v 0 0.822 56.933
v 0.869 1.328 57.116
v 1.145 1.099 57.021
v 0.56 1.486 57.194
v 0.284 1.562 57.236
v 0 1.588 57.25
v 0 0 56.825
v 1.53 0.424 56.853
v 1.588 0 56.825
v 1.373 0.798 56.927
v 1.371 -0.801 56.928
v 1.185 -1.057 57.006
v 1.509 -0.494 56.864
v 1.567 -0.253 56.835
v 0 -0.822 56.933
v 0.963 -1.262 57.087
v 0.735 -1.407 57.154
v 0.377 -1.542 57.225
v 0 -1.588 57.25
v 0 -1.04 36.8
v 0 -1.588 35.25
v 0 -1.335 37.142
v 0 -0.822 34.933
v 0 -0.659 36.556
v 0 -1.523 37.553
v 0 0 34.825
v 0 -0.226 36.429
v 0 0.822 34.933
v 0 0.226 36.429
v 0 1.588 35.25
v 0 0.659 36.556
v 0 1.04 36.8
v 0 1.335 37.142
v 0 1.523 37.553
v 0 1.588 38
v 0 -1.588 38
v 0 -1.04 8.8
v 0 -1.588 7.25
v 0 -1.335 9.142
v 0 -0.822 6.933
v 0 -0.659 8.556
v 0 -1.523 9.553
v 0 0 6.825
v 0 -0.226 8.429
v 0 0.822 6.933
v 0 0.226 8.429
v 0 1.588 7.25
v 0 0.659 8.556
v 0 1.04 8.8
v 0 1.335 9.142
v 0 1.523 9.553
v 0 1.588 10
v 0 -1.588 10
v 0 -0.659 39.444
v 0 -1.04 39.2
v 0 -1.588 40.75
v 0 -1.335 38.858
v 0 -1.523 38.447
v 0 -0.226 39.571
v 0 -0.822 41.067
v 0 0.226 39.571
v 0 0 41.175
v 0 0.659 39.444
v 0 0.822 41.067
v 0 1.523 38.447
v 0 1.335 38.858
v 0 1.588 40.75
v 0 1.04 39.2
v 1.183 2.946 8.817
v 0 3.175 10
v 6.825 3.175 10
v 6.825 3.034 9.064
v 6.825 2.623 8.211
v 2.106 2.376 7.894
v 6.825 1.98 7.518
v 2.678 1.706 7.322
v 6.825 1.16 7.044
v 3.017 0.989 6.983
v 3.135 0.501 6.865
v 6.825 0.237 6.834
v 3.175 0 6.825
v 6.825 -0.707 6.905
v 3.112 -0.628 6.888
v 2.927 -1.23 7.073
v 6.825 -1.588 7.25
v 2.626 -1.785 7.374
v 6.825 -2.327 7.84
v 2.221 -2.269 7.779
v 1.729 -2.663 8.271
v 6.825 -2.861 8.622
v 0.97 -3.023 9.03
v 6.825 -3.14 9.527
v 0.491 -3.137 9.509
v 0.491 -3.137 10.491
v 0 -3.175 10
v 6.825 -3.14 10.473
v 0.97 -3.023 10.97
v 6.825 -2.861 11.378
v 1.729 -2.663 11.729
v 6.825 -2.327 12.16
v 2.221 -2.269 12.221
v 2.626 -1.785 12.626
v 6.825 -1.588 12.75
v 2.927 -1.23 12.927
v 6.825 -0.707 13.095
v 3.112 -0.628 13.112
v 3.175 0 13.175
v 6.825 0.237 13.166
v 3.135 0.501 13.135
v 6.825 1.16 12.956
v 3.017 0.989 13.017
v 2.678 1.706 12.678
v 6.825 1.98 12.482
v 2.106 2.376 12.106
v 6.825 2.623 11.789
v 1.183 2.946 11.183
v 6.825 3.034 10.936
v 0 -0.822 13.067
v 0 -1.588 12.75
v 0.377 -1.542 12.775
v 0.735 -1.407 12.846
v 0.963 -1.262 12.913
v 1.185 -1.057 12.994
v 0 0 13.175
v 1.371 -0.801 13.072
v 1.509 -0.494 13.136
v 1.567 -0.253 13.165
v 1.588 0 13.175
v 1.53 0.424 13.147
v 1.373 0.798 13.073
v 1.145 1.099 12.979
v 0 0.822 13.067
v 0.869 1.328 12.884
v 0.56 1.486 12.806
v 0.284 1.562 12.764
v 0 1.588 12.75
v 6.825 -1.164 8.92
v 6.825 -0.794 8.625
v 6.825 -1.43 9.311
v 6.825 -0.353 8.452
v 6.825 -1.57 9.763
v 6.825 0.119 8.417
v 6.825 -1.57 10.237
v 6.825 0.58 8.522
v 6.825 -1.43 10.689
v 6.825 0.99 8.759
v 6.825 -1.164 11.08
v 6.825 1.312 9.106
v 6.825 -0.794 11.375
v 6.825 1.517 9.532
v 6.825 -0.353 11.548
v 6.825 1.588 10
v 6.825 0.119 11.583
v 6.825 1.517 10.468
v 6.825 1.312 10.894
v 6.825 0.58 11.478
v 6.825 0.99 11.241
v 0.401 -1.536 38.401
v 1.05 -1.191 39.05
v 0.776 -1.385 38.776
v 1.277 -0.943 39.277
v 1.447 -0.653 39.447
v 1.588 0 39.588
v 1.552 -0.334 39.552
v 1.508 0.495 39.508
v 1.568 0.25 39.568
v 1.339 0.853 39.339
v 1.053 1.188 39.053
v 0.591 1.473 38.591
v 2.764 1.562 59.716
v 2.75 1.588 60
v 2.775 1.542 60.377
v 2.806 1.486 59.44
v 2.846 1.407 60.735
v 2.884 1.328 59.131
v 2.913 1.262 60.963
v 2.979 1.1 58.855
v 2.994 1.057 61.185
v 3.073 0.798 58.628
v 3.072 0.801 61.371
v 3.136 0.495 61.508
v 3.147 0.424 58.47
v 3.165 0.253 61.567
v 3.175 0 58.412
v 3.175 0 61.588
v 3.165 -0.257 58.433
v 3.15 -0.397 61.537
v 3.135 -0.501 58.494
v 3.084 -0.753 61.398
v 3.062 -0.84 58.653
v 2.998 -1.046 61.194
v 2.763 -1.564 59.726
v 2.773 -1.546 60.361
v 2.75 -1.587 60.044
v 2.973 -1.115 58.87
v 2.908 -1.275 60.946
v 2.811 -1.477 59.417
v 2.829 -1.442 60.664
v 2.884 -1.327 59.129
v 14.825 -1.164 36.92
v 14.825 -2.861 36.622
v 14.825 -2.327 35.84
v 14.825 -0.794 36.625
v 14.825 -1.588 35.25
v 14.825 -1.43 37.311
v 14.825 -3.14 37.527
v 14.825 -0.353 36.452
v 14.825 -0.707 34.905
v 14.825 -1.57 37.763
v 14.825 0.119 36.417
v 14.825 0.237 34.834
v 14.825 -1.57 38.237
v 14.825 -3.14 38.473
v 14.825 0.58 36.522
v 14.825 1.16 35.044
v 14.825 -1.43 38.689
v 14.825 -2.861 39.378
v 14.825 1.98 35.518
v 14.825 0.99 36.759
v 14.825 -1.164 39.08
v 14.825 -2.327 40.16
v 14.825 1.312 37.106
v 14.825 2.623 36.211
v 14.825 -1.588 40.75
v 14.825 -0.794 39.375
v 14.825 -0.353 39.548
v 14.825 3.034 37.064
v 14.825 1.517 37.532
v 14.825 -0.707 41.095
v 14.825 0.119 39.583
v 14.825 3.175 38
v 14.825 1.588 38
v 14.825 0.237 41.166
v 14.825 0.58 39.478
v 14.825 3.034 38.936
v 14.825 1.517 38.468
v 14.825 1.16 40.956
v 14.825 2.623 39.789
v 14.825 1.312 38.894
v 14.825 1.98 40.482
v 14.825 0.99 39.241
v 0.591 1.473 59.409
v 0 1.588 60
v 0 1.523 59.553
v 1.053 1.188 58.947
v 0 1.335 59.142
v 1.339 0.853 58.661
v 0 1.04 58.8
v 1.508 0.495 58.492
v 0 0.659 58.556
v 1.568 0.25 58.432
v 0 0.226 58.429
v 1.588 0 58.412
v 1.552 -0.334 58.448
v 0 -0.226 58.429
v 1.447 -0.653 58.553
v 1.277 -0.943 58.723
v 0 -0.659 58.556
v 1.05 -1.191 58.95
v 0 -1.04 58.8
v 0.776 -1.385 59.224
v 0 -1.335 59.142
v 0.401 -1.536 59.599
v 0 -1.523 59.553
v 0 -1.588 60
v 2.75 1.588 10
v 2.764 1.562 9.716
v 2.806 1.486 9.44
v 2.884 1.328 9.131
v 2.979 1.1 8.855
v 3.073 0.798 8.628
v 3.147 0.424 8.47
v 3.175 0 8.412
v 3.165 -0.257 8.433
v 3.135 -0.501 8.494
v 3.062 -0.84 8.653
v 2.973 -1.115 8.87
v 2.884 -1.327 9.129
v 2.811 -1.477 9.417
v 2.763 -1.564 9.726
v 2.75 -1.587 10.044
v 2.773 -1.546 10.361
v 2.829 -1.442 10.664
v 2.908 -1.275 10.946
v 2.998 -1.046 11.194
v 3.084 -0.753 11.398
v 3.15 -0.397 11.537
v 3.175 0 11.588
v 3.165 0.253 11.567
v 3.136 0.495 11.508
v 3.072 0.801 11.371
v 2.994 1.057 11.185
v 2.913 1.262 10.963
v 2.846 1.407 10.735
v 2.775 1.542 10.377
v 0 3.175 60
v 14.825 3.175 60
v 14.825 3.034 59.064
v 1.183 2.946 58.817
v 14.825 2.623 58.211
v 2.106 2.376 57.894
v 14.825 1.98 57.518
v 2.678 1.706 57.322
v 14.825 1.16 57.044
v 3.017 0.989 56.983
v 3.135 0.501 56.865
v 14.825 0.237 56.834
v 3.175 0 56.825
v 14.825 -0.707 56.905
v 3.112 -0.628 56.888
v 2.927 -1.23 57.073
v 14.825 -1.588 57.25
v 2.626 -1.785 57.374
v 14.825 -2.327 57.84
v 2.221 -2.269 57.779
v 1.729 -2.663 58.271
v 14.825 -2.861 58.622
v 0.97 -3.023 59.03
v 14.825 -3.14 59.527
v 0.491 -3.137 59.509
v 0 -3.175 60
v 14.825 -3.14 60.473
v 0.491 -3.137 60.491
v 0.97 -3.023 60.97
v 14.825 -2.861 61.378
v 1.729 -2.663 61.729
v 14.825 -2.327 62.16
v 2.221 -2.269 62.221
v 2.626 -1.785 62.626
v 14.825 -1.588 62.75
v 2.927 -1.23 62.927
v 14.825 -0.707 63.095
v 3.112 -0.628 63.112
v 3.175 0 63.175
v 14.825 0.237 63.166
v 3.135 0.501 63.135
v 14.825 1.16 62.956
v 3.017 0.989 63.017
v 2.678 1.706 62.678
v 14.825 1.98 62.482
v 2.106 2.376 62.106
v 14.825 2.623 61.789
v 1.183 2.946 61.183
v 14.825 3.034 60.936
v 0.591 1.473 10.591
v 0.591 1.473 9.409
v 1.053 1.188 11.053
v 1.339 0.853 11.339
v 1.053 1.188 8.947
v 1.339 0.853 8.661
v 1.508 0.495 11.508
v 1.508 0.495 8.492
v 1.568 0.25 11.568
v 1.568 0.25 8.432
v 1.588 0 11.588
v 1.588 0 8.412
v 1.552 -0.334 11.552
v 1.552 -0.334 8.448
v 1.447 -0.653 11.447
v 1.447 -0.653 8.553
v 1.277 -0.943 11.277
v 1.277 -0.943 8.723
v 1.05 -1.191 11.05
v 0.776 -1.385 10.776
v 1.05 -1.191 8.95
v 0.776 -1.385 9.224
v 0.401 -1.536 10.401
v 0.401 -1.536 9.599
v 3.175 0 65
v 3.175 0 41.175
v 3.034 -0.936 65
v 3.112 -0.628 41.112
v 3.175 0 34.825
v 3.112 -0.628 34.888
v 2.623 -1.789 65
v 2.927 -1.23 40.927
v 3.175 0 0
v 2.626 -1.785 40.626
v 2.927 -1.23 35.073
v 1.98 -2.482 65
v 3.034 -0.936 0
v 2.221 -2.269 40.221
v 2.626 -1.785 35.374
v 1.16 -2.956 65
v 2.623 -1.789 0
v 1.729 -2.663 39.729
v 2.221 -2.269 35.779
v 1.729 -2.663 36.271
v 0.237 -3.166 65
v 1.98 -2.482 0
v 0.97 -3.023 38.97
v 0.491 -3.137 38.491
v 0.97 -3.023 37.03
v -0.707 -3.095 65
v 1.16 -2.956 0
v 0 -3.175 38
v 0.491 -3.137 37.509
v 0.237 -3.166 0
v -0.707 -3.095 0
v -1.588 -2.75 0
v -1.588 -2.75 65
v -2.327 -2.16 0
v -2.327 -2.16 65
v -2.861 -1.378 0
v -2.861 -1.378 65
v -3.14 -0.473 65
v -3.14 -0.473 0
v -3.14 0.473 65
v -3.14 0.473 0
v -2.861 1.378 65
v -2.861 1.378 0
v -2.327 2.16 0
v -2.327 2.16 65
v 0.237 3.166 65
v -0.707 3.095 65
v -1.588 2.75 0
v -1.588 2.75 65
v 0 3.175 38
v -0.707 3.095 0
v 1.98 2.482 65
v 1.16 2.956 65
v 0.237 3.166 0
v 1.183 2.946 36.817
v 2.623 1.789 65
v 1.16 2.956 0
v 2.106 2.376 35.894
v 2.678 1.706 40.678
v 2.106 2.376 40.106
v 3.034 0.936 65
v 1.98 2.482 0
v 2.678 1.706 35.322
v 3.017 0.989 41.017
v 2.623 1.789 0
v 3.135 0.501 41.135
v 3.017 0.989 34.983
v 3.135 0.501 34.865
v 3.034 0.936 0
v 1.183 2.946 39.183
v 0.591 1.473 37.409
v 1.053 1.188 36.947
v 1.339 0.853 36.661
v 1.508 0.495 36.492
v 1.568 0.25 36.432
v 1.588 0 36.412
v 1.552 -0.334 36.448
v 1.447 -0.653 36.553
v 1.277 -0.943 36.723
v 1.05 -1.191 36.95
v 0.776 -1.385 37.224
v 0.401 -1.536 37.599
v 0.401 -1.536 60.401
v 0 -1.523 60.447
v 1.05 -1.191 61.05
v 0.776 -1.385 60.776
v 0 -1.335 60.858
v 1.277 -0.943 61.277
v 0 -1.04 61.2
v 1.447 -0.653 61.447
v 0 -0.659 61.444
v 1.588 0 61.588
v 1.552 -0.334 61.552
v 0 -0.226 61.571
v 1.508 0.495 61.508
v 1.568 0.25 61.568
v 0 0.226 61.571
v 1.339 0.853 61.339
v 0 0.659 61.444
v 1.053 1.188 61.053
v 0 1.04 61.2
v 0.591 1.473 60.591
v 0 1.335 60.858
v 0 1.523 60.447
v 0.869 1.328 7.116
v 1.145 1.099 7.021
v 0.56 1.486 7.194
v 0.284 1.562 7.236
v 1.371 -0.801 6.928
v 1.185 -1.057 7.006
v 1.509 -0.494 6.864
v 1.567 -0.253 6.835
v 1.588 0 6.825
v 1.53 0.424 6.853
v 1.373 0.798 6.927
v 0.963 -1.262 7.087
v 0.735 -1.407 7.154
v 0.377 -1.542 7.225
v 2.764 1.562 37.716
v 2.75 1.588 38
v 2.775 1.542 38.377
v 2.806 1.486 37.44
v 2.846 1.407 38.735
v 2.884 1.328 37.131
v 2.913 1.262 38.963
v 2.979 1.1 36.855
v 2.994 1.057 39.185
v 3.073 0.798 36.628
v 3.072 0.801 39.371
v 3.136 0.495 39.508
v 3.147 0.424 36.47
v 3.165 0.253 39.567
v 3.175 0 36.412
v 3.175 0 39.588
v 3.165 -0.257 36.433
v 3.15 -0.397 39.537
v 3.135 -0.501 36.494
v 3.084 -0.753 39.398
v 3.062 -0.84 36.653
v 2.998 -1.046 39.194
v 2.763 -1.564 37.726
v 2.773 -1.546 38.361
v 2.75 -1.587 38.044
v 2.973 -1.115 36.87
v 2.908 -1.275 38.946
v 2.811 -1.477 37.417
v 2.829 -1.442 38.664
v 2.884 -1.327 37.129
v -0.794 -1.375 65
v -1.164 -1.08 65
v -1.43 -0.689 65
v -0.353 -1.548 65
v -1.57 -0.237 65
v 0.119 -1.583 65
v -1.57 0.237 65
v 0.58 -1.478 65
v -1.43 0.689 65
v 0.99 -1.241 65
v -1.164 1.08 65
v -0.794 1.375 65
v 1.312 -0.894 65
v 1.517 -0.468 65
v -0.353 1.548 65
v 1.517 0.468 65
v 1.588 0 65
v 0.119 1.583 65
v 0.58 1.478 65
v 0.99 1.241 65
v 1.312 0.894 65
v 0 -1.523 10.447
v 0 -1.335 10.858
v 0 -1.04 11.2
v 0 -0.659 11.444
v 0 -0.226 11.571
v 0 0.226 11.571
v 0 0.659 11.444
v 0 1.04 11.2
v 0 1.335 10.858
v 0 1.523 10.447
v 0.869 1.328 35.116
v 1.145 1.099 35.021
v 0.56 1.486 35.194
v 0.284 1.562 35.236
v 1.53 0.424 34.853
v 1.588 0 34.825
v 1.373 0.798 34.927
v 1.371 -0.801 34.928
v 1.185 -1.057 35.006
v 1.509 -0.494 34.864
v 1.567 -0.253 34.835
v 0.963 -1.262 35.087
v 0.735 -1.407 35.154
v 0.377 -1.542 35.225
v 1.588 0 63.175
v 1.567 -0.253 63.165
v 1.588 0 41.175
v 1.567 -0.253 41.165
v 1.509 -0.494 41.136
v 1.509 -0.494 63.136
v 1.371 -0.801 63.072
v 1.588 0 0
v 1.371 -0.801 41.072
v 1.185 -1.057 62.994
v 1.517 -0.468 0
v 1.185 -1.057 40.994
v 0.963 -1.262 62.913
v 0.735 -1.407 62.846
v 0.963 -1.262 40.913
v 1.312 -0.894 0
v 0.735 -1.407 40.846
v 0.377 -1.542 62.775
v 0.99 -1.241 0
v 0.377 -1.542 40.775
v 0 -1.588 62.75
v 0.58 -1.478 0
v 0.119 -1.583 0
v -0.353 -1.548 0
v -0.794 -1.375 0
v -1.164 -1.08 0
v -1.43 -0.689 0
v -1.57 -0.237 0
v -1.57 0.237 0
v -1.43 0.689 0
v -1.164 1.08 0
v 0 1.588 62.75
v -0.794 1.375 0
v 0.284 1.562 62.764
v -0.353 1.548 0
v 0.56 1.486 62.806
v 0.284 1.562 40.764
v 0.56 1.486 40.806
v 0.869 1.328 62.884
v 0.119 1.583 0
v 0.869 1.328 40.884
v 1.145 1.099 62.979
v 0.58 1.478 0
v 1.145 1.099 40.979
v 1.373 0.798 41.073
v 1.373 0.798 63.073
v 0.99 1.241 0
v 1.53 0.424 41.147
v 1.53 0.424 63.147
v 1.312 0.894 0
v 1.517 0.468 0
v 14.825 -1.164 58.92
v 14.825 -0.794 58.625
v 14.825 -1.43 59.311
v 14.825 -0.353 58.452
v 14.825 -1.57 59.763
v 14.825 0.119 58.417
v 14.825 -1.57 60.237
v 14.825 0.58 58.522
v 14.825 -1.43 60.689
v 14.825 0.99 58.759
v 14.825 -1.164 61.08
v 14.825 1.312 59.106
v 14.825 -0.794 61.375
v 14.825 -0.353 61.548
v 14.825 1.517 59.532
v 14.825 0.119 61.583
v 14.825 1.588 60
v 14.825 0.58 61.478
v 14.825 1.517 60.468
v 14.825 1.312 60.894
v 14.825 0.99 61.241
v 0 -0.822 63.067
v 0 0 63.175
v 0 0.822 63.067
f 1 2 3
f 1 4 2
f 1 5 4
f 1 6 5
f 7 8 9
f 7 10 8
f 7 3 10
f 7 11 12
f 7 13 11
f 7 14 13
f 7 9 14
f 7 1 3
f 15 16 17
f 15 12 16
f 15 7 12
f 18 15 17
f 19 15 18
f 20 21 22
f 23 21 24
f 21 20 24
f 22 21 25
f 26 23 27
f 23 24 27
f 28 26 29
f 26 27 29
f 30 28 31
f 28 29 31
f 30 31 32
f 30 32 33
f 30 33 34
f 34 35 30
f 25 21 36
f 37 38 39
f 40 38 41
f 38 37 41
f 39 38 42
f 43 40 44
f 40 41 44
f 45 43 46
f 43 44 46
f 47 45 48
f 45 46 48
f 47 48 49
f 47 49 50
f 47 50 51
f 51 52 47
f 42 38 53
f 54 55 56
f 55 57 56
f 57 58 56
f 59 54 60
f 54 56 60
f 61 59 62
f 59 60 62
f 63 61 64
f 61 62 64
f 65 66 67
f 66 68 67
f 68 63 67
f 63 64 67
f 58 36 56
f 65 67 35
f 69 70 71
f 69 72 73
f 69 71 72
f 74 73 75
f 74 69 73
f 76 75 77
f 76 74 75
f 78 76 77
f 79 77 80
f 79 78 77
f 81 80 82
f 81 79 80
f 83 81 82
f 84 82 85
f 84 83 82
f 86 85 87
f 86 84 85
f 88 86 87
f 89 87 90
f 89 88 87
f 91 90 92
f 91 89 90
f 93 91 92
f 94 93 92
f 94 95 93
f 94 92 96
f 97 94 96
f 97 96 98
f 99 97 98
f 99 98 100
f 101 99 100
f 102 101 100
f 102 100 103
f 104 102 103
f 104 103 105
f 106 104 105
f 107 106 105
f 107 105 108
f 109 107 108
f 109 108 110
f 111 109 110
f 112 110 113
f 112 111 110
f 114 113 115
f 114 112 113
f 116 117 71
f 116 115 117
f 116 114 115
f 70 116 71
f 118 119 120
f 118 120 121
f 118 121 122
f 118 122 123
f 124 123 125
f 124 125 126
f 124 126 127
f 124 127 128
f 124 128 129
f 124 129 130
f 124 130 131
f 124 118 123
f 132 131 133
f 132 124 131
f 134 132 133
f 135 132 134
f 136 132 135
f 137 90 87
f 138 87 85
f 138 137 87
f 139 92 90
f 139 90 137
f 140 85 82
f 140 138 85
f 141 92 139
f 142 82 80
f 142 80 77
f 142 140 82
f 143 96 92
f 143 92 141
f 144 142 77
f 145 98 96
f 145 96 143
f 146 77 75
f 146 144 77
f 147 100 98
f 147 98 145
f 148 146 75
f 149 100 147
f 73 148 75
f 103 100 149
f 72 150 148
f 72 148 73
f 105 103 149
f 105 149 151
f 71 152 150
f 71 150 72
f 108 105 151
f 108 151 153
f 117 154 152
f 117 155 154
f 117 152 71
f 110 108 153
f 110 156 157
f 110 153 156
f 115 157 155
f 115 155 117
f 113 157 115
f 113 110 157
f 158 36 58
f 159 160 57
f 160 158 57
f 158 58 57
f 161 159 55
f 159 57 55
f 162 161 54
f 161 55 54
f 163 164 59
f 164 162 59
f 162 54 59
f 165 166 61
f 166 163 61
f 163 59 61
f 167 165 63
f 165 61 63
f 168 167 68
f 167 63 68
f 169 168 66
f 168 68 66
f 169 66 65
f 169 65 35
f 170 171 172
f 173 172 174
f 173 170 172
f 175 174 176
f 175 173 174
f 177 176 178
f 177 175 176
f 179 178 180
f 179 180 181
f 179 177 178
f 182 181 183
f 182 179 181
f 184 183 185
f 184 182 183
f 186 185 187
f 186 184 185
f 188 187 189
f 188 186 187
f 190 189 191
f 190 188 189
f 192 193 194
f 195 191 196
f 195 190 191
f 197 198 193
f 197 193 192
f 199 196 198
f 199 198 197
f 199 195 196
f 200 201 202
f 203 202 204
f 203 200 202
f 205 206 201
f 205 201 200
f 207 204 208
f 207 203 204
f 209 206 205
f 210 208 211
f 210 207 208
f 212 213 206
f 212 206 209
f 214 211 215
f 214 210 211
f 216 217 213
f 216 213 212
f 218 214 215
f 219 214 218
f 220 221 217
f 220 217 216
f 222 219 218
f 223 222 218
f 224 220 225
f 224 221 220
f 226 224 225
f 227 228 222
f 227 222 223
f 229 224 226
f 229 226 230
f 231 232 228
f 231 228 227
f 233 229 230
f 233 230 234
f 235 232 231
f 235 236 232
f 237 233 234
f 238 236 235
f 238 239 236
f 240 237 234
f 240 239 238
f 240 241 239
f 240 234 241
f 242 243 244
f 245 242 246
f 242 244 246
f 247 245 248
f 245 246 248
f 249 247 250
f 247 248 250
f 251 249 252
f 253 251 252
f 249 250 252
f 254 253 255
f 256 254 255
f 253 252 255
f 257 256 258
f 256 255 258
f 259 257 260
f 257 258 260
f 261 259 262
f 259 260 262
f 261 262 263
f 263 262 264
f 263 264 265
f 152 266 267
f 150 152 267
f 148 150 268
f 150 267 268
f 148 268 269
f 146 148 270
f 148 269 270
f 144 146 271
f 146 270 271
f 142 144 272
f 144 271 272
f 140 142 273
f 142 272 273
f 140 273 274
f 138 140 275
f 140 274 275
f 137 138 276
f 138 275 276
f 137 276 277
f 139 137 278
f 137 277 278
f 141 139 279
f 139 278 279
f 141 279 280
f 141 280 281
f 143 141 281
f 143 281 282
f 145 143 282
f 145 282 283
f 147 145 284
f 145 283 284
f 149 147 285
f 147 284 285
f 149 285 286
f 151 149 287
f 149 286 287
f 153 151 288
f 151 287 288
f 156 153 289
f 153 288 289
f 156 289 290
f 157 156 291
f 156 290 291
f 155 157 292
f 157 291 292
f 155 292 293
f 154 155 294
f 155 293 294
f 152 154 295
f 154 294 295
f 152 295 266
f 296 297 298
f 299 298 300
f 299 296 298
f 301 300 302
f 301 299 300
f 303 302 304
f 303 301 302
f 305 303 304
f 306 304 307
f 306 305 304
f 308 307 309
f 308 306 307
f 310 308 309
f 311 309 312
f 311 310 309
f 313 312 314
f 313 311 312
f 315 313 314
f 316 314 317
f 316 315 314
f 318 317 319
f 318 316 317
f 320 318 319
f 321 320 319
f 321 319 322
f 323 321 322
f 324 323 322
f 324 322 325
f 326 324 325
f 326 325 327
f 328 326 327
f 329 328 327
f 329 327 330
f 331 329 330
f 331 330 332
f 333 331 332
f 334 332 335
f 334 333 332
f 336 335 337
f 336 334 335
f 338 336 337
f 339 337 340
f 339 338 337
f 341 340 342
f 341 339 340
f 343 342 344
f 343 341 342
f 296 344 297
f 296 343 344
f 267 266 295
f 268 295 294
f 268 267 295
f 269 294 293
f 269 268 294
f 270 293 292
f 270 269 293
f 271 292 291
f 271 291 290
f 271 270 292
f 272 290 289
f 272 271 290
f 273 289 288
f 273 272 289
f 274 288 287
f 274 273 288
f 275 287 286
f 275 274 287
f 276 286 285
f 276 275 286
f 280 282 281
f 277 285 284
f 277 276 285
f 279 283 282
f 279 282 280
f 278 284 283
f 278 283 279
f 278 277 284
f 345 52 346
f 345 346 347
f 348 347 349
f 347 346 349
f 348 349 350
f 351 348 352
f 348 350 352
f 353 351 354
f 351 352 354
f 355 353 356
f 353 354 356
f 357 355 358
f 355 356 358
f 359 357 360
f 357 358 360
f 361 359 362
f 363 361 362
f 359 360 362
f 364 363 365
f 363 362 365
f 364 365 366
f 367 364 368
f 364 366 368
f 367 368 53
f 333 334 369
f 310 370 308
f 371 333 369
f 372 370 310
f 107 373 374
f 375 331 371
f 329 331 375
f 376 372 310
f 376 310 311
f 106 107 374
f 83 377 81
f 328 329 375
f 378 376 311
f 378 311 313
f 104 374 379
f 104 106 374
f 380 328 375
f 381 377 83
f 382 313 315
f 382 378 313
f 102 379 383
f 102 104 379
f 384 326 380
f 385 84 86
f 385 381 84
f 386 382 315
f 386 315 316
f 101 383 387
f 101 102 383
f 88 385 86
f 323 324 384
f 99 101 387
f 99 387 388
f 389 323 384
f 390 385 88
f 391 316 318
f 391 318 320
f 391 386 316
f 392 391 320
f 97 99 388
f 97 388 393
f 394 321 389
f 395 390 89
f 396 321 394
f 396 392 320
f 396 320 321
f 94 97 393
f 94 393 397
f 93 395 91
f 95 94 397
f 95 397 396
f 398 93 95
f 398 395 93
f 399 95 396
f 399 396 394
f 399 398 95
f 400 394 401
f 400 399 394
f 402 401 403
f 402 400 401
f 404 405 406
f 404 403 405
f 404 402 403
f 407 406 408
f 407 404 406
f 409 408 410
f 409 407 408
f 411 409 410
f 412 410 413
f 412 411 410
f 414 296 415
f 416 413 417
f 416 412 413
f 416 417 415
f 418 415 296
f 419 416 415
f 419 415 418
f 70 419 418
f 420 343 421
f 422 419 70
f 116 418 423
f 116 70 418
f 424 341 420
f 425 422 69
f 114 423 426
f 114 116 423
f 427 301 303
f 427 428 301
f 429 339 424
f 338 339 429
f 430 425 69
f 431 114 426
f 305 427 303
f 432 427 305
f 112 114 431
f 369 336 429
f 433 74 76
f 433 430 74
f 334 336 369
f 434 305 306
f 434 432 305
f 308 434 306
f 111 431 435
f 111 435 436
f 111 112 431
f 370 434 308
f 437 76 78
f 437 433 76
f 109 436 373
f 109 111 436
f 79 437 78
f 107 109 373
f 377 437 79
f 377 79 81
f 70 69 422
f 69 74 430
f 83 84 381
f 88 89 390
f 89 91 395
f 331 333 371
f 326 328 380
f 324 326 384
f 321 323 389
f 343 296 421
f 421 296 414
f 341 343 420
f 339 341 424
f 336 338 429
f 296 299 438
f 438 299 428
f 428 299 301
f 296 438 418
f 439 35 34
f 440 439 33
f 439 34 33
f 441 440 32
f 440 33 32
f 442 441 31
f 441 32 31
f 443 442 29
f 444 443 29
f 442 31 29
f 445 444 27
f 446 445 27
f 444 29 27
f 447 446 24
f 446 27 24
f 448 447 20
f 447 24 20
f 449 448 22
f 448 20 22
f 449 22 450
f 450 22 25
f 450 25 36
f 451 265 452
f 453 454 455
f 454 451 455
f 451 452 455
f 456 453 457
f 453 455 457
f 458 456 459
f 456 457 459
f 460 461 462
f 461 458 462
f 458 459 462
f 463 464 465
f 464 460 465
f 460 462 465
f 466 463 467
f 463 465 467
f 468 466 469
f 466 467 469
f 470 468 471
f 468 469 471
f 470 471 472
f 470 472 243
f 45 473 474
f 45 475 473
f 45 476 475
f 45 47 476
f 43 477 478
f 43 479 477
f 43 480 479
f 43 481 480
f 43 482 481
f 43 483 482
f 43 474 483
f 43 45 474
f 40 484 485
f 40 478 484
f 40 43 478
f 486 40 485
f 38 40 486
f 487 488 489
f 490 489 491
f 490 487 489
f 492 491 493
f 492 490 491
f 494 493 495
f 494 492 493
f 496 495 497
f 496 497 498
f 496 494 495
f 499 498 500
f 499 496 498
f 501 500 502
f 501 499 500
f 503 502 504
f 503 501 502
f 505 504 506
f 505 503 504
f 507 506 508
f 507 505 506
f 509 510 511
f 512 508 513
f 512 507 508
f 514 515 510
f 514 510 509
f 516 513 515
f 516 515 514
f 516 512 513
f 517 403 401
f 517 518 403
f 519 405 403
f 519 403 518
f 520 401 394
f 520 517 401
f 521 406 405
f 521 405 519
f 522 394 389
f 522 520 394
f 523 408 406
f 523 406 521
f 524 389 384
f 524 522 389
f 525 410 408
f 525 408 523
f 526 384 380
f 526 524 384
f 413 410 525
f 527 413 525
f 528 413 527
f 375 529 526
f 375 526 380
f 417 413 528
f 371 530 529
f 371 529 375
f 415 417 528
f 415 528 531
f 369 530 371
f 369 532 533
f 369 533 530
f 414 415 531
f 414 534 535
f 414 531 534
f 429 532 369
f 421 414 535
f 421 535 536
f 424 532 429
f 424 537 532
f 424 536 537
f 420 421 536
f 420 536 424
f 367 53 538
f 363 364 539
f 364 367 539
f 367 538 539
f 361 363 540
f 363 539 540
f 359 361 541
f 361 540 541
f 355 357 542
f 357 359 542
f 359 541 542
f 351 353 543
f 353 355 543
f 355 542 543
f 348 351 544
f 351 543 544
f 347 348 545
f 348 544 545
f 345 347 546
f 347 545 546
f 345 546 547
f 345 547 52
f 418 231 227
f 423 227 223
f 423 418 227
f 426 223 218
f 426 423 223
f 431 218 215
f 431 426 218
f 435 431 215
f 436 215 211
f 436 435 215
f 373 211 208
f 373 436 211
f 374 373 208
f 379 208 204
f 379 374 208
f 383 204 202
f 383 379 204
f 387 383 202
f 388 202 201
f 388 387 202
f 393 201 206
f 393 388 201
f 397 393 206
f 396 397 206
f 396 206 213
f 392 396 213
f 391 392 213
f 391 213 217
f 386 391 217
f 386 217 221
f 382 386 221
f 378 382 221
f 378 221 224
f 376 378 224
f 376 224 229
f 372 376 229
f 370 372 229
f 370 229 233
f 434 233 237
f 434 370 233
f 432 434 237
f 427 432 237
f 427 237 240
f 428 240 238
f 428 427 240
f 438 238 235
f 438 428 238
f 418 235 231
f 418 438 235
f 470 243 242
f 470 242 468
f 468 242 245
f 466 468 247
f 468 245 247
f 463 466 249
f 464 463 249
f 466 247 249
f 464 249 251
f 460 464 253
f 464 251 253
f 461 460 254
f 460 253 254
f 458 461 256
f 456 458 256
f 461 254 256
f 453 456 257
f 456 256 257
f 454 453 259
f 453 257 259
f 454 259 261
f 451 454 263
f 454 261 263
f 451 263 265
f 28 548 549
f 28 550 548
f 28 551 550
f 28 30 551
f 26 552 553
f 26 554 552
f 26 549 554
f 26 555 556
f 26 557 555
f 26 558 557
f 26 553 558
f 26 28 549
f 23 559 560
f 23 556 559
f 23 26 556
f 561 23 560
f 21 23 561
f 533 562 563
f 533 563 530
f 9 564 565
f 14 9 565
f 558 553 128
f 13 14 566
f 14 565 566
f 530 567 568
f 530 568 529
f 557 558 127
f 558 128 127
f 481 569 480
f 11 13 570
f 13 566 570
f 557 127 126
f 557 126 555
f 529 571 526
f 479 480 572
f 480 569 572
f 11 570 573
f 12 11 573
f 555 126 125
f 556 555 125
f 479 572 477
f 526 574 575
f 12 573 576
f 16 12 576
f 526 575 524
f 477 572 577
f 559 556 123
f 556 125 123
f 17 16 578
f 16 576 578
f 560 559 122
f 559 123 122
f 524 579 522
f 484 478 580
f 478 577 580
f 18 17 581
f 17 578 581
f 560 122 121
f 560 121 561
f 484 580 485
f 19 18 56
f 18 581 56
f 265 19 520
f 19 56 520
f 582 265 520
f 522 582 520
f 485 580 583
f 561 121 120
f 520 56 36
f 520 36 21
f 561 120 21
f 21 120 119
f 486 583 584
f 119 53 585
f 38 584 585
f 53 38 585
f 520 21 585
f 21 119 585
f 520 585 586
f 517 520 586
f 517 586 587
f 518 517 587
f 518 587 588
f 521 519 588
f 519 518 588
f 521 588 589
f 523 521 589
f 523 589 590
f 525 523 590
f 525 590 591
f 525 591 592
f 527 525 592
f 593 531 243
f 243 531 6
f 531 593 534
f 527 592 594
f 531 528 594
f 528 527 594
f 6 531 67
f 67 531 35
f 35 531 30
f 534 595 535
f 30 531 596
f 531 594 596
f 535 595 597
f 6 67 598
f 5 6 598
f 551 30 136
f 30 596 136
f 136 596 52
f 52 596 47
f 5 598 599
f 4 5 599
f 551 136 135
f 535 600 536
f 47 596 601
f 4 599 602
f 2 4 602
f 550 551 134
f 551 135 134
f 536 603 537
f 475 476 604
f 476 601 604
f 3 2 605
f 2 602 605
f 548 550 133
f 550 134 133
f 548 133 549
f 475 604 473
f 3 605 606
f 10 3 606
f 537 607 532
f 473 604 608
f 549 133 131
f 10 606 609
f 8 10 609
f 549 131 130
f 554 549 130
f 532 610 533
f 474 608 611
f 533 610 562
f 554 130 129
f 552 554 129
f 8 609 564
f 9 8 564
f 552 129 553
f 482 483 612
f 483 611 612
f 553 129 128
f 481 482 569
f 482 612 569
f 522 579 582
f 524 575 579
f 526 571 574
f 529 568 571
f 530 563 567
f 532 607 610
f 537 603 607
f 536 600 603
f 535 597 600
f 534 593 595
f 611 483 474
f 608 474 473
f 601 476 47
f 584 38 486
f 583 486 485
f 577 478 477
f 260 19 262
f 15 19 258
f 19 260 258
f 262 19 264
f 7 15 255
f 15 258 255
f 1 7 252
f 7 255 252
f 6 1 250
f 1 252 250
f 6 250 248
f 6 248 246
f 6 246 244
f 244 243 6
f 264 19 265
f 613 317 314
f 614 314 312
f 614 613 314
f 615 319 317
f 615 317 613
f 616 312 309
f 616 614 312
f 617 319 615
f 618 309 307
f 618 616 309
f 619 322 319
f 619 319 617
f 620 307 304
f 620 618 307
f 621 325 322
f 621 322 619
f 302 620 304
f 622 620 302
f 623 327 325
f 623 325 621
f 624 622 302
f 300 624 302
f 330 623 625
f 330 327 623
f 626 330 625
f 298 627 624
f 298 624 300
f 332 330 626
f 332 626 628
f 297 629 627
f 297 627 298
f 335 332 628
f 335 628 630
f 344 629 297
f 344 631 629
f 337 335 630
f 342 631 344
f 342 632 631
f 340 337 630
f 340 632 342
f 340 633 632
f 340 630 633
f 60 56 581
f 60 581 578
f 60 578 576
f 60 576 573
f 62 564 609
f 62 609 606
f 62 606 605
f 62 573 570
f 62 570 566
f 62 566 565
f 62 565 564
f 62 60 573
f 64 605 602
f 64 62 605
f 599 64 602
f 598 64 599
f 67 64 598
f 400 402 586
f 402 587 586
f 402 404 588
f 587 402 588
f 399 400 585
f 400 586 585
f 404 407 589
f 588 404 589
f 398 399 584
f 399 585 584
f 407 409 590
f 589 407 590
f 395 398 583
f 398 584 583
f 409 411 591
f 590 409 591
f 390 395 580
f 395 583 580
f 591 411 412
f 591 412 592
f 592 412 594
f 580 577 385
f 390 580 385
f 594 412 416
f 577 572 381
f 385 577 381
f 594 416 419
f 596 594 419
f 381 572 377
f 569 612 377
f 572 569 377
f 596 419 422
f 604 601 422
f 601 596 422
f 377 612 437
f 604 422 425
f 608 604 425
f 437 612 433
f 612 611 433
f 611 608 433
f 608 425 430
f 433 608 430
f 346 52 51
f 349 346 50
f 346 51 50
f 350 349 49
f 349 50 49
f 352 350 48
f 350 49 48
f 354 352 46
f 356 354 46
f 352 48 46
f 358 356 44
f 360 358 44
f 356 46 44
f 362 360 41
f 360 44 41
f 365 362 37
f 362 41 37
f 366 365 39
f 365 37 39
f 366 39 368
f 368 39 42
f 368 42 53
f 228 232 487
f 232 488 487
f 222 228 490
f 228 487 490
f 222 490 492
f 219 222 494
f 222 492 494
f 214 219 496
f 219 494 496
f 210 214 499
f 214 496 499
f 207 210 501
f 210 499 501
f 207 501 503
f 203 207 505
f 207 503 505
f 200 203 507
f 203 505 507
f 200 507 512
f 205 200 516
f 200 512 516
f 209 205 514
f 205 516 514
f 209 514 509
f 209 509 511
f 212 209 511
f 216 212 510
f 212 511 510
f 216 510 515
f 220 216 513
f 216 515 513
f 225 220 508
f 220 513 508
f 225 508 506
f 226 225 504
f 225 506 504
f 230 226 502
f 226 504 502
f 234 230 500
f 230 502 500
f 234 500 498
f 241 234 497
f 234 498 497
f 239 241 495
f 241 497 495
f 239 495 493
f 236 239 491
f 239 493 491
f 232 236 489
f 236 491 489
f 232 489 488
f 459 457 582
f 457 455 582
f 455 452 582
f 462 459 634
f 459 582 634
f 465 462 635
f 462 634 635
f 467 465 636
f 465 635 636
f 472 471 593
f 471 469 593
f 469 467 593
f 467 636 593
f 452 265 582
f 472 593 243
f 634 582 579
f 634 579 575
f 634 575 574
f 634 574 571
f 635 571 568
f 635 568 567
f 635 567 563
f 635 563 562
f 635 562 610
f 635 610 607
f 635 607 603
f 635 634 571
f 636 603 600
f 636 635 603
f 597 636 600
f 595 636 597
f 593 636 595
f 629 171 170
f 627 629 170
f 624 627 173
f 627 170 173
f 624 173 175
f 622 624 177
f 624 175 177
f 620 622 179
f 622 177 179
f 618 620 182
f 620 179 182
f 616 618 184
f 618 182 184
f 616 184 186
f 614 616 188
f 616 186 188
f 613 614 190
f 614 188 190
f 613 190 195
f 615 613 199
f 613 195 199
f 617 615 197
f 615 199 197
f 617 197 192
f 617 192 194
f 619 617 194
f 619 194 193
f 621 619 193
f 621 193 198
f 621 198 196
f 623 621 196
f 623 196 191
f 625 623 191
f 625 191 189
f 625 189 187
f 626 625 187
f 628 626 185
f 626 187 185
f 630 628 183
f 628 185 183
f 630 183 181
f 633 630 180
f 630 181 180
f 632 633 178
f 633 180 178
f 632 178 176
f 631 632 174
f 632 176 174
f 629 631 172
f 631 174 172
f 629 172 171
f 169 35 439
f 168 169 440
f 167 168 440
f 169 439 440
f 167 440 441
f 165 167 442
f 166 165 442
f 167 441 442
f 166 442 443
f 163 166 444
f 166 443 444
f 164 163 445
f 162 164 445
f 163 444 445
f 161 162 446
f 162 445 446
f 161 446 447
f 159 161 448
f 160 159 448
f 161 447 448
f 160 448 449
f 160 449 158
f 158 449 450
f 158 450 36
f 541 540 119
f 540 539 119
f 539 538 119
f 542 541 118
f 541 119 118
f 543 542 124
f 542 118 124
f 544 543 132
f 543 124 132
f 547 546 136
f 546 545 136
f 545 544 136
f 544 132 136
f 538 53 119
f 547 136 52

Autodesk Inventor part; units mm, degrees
ref_plane "YZ Plane" through (0, 0, 0) normal (1, 0, 0) x (0, 1, 0)
ref_plane "XZ Plane" through (0, 0, 0) normal (0, 1, 0) x (-1, 0, 0)
ref_plane "XY Plane" through (0, 0, 0) normal (0, 0, 1) x (1, 0, 0)
sketch "Sketch1" plane through (0, 0, 0) normal (0, 0, 1) x (1, 0, 0)
  circle A0 centre (0, 0) radius 3.175
  circle A1 centre (0, 0) radius 1.5875
  dimension "d0" = 6.35
  dimension "d1" = 3.175
extrude "Extrusion1" add sketch "Sketch1" along normal blind 65
sketch "Sketch2" plane through (0, 0, 0) normal (1, 0, 0) x (0, 1, 0)
  circle A0 centre (0, 60) radius 3.175
  circle A1 centre (0, 60) radius 1.5875
  line L0 (3.175, 65) -> (-3.175, 65) projected
  circle A2 centre (0, 38) radius 3.175
  circle A3 centre (0, 38) radius 1.5875
  circle A4 centre (0, 10) radius 3.175
  circle A5 centre (0, 10) radius 1.5875
  point P0 (0, 0)
  dimension "d4" = 6.35
  dimension "d5" = 3.175
  dimension "d6" = 5
  dimension "d7" = 6.35
  dimension "d8" = 3.175
  dimension "d9" = 27
  dimension "d10" = 6.35
  dimension "d11" = 3.175
  dimension "d12" = 55
extrude "Extrusion2" add sketch "Sketch2" along normal blind 14.825 contours A0 | A2
extrude "Extrusion3" add sketch "Sketch2" along normal blind 6.825 contours A4
properties part number "Valve Tube"
